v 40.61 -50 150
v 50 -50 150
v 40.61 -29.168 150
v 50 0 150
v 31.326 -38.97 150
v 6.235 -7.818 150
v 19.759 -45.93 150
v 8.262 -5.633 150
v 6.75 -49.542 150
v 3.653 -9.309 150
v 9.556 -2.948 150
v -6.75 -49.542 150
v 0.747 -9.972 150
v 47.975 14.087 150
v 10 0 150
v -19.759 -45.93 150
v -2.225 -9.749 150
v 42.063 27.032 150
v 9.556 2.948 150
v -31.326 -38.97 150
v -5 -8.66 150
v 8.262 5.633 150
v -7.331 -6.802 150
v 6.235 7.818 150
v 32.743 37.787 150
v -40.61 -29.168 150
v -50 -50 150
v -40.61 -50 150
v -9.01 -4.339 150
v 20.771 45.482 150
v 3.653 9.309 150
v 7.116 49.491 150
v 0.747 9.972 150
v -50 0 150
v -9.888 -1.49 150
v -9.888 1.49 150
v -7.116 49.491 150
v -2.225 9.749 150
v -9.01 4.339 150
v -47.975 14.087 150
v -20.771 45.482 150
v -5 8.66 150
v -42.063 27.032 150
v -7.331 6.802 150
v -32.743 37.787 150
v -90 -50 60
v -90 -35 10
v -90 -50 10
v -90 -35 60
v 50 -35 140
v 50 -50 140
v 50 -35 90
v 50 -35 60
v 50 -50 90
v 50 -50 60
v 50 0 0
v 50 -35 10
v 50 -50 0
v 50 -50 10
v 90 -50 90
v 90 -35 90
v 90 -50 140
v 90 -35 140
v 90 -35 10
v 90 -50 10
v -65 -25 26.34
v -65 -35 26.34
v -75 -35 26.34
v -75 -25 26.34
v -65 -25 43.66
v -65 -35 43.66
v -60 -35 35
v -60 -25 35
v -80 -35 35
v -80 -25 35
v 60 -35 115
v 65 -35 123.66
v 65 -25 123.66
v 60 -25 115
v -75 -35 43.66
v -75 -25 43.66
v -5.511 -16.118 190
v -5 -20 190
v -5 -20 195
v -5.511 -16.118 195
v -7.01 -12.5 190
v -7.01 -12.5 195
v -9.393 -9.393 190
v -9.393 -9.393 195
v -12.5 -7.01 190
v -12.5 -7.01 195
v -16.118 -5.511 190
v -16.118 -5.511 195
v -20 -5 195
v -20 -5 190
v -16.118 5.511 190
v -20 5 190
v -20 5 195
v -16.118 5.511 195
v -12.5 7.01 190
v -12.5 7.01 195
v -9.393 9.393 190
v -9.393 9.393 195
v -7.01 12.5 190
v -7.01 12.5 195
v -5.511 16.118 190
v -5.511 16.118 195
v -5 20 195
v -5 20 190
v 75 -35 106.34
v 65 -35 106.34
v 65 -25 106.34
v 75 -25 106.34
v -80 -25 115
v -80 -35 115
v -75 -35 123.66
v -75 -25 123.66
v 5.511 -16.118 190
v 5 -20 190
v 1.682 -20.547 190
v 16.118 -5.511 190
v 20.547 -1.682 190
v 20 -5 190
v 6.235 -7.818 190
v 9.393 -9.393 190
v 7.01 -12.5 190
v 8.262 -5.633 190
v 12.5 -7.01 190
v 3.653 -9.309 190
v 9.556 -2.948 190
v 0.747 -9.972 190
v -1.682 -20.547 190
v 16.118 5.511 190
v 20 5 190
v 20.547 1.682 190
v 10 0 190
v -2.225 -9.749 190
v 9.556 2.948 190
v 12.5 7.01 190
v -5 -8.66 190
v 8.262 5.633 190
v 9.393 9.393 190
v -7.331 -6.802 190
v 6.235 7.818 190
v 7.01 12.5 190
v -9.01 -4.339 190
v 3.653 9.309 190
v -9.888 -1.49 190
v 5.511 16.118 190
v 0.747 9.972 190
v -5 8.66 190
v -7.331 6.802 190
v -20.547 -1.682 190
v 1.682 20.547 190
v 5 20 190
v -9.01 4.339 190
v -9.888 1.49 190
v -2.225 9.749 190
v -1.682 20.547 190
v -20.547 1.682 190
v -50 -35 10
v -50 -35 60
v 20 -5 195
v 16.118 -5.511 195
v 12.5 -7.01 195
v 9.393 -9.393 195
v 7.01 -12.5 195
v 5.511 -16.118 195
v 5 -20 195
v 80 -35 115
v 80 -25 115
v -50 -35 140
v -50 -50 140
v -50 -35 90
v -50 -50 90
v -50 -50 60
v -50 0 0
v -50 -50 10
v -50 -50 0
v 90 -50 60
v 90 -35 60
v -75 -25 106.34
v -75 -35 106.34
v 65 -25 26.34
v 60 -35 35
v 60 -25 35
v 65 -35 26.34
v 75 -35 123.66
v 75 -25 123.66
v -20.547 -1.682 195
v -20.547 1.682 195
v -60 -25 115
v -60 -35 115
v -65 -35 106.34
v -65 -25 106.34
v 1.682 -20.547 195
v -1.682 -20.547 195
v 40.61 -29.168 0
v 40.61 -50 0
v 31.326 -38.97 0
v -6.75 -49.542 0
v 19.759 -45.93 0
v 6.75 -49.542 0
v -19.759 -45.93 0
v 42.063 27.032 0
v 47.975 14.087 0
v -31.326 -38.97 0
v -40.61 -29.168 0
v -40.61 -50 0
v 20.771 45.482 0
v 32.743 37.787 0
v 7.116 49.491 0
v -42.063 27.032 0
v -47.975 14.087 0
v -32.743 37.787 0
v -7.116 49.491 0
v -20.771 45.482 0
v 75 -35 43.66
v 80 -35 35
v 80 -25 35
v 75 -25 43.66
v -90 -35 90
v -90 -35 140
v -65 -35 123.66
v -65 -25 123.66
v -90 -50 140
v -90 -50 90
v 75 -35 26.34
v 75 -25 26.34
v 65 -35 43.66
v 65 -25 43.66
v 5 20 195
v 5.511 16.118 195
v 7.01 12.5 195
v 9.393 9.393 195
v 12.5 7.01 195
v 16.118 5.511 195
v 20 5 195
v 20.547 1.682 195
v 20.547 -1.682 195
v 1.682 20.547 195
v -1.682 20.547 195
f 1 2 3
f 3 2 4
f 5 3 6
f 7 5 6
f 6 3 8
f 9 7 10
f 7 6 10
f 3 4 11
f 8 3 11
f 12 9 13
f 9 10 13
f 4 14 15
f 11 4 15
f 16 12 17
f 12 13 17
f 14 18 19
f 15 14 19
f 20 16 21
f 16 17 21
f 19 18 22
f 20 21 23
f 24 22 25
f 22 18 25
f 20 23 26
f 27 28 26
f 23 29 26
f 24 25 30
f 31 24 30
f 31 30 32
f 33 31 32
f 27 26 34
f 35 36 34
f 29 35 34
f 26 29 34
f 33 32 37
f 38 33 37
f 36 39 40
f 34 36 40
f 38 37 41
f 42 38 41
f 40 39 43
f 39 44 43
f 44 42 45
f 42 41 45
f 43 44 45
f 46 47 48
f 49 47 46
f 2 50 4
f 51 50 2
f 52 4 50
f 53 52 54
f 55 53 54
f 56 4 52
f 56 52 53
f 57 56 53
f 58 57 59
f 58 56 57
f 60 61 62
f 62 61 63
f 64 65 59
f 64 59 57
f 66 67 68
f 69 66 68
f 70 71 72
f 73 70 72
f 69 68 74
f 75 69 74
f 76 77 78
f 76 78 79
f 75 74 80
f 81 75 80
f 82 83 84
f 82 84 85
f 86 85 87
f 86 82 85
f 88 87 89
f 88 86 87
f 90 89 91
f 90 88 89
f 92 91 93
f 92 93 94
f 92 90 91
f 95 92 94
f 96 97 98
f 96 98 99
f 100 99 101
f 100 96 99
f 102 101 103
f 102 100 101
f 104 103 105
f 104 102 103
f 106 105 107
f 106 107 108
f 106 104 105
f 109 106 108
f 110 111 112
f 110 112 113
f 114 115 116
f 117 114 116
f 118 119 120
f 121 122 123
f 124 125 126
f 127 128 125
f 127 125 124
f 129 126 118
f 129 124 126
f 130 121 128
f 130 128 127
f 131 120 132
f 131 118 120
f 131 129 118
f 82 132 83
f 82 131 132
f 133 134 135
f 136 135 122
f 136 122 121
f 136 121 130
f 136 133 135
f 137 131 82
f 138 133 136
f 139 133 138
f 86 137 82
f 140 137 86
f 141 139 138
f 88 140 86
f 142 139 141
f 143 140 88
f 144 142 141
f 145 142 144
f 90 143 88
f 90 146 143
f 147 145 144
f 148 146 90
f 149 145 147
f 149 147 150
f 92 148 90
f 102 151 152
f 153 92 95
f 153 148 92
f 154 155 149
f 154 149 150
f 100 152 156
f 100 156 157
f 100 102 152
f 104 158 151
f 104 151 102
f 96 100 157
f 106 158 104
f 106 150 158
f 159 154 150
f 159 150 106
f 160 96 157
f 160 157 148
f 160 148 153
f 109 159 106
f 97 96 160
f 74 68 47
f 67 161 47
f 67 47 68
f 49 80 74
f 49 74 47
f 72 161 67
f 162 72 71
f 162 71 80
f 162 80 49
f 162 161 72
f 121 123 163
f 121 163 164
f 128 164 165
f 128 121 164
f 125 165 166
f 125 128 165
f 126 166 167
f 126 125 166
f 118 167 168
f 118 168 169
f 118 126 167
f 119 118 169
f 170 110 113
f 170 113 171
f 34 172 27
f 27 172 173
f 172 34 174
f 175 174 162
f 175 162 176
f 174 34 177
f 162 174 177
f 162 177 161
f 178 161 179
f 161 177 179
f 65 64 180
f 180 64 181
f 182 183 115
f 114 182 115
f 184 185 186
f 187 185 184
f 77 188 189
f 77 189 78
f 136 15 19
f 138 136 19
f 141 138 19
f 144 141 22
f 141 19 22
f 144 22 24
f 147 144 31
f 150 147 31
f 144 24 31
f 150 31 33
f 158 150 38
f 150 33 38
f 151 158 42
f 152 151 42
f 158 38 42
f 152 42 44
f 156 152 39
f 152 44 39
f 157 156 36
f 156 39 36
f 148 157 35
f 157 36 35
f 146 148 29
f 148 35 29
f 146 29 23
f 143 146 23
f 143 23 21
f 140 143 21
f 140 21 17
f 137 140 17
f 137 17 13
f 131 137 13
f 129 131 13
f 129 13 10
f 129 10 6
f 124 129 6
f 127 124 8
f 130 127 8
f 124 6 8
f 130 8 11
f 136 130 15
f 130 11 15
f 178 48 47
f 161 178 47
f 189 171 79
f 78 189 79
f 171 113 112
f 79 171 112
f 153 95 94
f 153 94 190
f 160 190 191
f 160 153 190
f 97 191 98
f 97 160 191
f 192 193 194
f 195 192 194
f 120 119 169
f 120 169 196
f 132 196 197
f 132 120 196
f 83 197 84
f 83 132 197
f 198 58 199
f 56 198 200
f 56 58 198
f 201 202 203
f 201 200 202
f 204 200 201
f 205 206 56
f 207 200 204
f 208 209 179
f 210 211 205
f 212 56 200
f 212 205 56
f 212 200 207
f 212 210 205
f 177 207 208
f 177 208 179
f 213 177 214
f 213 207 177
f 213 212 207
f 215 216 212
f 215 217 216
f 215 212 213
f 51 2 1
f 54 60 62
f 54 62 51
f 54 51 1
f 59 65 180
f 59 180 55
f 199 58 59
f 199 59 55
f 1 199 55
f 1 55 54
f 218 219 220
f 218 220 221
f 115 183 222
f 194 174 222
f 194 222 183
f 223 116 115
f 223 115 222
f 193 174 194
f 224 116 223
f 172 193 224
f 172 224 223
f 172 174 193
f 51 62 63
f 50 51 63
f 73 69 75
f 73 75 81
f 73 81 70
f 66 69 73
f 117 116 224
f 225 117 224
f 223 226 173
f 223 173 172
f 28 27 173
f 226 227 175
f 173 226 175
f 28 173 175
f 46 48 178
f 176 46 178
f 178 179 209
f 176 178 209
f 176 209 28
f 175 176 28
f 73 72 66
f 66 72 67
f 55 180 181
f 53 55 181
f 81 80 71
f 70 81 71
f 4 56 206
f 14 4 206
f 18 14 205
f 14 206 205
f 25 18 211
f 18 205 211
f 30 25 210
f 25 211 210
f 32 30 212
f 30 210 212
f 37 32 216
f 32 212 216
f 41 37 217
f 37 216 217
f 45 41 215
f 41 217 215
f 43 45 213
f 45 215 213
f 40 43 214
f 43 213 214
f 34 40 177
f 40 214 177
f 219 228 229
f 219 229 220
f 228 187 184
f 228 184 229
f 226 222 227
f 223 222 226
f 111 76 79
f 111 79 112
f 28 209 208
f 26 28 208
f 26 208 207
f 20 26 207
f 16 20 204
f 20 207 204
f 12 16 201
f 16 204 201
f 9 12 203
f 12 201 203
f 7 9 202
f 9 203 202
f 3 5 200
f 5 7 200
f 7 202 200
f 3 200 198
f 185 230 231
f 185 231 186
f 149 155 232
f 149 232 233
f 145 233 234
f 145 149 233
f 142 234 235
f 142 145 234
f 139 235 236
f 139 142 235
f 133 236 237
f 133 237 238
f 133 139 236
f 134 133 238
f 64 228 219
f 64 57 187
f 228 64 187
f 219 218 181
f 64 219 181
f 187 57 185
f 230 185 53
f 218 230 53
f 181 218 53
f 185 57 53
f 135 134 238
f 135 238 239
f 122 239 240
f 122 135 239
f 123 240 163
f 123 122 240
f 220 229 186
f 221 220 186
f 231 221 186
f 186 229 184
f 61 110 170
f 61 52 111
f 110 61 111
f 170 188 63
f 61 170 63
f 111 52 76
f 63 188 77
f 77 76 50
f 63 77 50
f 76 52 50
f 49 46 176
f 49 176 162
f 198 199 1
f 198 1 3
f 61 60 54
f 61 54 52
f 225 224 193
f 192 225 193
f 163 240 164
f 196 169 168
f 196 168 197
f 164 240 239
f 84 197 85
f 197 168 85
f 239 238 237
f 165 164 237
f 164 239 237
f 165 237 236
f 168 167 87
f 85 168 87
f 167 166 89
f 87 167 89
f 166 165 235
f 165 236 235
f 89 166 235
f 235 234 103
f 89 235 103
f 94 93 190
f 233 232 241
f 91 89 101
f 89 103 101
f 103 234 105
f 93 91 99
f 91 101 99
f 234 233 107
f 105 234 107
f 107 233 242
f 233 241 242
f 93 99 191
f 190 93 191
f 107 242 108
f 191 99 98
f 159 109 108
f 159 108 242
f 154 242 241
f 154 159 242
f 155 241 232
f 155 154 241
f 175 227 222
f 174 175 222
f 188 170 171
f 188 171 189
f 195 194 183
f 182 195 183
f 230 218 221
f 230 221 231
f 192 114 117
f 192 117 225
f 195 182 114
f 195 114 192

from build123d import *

# Parameters (mm, degrees)
SZKIC1_R                    = 50
DODANIE_WYCI_GNI_CIE1_DEPTH = 150
SZKIC2_R                    = 10
DODANIE_WYCI_GNI_CIE2_DEPTH = 40
DODANIE_WYCI_GNI_CIE3_DEPTH = 5
DODANIE_WYCI_GNI_CIE4_DEPTH = 150
SZKIC5_W                    = 50
SZKIC5_H                    = 15
DODANIE_WYCI_GNI_CIE5_DEPTH = 40
DODANIE_WYCI_GNI_CIE6_DEPTH = 10


with BuildPart() as part:
    # Szkic1 → Dodanie-wyciągnięcie1 (new body)
    with BuildSketch(Plane.XY):
        Circle(SZKIC1_R)
    extrude(amount=DODANIE_WYCI_GNI_CIE1_DEPTH)

    # Szkic2 → Dodanie-wyciągnięcie2 (add)
    with BuildSketch(Plane.XY.offset(150)):
        Circle(SZKIC2_R)
    extrude(amount=DODANIE_WYCI_GNI_CIE2_DEPTH)

    # Szkic3 → Dodanie-wyciągnięcie3 (add)
    with BuildSketch(Plane.XY.offset(190)):
        with BuildLine():
            ThreePointArc((-5, -20), (-9.393398282, -9.393398282), (-20, -5))
            ThreePointArc((-20, -5), (-20.615528128, 0), (-20, 5))
            ThreePointArc((-20, 5), (-9.393398282, 9.393398282), (-5, 20))
            ThreePointArc((-5, 20), (0, 20.615528128), (5, 20))
            ThreePointArc((5, 20), (9.393398282, 9.393398282), (20, 5))
            ThreePointArc((20, 5), (20.615528128, 0), (20, -5))
            ThreePointArc((20, -5), (9.393398282, -9.393398282), (5, -20))
            ThreePointArc((5, -20), (0, -20.615528128), (-5, -20))
        make_face()
    extrude(amount=DODANIE_WYCI_GNI_CIE3_DEPTH)

    # Szkic4 → Dodanie-wyciągnięcie4 (add)
    with BuildSketch(Plane.XY):
        Polygon((-50, 0), (-50, -50), (-40.610421469, -50), (-40.610421469, -29.168367595), align=None)
    dodanie_wyci_gni_cie4 = extrude(amount=DODANIE_WYCI_GNI_CIE4_DEPTH)

    # Szkic5 → Dodanie-wyciągnięcie5 (add)
    with BuildSketch(Plane.ZY.offset(50)):
        with Locations((35, -42.5)):
            Rectangle(SZKIC5_W, SZKIC5_H)
        with Locations((115, -42.5)):
            Rectangle(SZKIC5_W, SZKIC5_H)
    dodanie_wyci_gni_cie5 = extrude(amount=DODANIE_WYCI_GNI_CIE5_DEPTH)

    # Szkic6 → Dodanie-wyciągnięcie6 (add)
    with BuildSketch(Plane(origin=(0, -35, 0), x_dir=(1, 0, 0), z_dir=(0, 1, 0))):
        Polygon((-65, -26.339745962), (-75, -26.339745962), (-80, -35), (-75, -43.660254038), (-65, -43.660254038), (-60, -35), align=None)
        Polygon((-60, -115), (-65, -106.339745962), (-75, -106.339745962), (-80, -115), (-75, -123.660254038), (-65, -123.660254038), align=None)
    dodanie_wyci_gni_cie6 = extrude(amount=DODANIE_WYCI_GNI_CIE6_DEPTH)

    # Lustro1: Dodanie-wyciągnięcie4, Dodanie-wyciągnięcie5, Dodanie-wyciągnięcie6 across plane
    add(dodanie_wyci_gni_cie4.mirror(Plane(origin=(0, 0, 0), x_dir=(0, 0, 1), z_dir=(1, 0, 0))))
    add(dodanie_wyci_gni_cie5.mirror(Plane(origin=(0, 0, 0), x_dir=(0, 0, 1), z_dir=(1, 0, 0))))
    add(dodanie_wyci_gni_cie6.mirror(Plane(origin=(0, 0, 0), x_dir=(0, 0, 1), z_dir=(1, 0, 0))))


solid = part.part
